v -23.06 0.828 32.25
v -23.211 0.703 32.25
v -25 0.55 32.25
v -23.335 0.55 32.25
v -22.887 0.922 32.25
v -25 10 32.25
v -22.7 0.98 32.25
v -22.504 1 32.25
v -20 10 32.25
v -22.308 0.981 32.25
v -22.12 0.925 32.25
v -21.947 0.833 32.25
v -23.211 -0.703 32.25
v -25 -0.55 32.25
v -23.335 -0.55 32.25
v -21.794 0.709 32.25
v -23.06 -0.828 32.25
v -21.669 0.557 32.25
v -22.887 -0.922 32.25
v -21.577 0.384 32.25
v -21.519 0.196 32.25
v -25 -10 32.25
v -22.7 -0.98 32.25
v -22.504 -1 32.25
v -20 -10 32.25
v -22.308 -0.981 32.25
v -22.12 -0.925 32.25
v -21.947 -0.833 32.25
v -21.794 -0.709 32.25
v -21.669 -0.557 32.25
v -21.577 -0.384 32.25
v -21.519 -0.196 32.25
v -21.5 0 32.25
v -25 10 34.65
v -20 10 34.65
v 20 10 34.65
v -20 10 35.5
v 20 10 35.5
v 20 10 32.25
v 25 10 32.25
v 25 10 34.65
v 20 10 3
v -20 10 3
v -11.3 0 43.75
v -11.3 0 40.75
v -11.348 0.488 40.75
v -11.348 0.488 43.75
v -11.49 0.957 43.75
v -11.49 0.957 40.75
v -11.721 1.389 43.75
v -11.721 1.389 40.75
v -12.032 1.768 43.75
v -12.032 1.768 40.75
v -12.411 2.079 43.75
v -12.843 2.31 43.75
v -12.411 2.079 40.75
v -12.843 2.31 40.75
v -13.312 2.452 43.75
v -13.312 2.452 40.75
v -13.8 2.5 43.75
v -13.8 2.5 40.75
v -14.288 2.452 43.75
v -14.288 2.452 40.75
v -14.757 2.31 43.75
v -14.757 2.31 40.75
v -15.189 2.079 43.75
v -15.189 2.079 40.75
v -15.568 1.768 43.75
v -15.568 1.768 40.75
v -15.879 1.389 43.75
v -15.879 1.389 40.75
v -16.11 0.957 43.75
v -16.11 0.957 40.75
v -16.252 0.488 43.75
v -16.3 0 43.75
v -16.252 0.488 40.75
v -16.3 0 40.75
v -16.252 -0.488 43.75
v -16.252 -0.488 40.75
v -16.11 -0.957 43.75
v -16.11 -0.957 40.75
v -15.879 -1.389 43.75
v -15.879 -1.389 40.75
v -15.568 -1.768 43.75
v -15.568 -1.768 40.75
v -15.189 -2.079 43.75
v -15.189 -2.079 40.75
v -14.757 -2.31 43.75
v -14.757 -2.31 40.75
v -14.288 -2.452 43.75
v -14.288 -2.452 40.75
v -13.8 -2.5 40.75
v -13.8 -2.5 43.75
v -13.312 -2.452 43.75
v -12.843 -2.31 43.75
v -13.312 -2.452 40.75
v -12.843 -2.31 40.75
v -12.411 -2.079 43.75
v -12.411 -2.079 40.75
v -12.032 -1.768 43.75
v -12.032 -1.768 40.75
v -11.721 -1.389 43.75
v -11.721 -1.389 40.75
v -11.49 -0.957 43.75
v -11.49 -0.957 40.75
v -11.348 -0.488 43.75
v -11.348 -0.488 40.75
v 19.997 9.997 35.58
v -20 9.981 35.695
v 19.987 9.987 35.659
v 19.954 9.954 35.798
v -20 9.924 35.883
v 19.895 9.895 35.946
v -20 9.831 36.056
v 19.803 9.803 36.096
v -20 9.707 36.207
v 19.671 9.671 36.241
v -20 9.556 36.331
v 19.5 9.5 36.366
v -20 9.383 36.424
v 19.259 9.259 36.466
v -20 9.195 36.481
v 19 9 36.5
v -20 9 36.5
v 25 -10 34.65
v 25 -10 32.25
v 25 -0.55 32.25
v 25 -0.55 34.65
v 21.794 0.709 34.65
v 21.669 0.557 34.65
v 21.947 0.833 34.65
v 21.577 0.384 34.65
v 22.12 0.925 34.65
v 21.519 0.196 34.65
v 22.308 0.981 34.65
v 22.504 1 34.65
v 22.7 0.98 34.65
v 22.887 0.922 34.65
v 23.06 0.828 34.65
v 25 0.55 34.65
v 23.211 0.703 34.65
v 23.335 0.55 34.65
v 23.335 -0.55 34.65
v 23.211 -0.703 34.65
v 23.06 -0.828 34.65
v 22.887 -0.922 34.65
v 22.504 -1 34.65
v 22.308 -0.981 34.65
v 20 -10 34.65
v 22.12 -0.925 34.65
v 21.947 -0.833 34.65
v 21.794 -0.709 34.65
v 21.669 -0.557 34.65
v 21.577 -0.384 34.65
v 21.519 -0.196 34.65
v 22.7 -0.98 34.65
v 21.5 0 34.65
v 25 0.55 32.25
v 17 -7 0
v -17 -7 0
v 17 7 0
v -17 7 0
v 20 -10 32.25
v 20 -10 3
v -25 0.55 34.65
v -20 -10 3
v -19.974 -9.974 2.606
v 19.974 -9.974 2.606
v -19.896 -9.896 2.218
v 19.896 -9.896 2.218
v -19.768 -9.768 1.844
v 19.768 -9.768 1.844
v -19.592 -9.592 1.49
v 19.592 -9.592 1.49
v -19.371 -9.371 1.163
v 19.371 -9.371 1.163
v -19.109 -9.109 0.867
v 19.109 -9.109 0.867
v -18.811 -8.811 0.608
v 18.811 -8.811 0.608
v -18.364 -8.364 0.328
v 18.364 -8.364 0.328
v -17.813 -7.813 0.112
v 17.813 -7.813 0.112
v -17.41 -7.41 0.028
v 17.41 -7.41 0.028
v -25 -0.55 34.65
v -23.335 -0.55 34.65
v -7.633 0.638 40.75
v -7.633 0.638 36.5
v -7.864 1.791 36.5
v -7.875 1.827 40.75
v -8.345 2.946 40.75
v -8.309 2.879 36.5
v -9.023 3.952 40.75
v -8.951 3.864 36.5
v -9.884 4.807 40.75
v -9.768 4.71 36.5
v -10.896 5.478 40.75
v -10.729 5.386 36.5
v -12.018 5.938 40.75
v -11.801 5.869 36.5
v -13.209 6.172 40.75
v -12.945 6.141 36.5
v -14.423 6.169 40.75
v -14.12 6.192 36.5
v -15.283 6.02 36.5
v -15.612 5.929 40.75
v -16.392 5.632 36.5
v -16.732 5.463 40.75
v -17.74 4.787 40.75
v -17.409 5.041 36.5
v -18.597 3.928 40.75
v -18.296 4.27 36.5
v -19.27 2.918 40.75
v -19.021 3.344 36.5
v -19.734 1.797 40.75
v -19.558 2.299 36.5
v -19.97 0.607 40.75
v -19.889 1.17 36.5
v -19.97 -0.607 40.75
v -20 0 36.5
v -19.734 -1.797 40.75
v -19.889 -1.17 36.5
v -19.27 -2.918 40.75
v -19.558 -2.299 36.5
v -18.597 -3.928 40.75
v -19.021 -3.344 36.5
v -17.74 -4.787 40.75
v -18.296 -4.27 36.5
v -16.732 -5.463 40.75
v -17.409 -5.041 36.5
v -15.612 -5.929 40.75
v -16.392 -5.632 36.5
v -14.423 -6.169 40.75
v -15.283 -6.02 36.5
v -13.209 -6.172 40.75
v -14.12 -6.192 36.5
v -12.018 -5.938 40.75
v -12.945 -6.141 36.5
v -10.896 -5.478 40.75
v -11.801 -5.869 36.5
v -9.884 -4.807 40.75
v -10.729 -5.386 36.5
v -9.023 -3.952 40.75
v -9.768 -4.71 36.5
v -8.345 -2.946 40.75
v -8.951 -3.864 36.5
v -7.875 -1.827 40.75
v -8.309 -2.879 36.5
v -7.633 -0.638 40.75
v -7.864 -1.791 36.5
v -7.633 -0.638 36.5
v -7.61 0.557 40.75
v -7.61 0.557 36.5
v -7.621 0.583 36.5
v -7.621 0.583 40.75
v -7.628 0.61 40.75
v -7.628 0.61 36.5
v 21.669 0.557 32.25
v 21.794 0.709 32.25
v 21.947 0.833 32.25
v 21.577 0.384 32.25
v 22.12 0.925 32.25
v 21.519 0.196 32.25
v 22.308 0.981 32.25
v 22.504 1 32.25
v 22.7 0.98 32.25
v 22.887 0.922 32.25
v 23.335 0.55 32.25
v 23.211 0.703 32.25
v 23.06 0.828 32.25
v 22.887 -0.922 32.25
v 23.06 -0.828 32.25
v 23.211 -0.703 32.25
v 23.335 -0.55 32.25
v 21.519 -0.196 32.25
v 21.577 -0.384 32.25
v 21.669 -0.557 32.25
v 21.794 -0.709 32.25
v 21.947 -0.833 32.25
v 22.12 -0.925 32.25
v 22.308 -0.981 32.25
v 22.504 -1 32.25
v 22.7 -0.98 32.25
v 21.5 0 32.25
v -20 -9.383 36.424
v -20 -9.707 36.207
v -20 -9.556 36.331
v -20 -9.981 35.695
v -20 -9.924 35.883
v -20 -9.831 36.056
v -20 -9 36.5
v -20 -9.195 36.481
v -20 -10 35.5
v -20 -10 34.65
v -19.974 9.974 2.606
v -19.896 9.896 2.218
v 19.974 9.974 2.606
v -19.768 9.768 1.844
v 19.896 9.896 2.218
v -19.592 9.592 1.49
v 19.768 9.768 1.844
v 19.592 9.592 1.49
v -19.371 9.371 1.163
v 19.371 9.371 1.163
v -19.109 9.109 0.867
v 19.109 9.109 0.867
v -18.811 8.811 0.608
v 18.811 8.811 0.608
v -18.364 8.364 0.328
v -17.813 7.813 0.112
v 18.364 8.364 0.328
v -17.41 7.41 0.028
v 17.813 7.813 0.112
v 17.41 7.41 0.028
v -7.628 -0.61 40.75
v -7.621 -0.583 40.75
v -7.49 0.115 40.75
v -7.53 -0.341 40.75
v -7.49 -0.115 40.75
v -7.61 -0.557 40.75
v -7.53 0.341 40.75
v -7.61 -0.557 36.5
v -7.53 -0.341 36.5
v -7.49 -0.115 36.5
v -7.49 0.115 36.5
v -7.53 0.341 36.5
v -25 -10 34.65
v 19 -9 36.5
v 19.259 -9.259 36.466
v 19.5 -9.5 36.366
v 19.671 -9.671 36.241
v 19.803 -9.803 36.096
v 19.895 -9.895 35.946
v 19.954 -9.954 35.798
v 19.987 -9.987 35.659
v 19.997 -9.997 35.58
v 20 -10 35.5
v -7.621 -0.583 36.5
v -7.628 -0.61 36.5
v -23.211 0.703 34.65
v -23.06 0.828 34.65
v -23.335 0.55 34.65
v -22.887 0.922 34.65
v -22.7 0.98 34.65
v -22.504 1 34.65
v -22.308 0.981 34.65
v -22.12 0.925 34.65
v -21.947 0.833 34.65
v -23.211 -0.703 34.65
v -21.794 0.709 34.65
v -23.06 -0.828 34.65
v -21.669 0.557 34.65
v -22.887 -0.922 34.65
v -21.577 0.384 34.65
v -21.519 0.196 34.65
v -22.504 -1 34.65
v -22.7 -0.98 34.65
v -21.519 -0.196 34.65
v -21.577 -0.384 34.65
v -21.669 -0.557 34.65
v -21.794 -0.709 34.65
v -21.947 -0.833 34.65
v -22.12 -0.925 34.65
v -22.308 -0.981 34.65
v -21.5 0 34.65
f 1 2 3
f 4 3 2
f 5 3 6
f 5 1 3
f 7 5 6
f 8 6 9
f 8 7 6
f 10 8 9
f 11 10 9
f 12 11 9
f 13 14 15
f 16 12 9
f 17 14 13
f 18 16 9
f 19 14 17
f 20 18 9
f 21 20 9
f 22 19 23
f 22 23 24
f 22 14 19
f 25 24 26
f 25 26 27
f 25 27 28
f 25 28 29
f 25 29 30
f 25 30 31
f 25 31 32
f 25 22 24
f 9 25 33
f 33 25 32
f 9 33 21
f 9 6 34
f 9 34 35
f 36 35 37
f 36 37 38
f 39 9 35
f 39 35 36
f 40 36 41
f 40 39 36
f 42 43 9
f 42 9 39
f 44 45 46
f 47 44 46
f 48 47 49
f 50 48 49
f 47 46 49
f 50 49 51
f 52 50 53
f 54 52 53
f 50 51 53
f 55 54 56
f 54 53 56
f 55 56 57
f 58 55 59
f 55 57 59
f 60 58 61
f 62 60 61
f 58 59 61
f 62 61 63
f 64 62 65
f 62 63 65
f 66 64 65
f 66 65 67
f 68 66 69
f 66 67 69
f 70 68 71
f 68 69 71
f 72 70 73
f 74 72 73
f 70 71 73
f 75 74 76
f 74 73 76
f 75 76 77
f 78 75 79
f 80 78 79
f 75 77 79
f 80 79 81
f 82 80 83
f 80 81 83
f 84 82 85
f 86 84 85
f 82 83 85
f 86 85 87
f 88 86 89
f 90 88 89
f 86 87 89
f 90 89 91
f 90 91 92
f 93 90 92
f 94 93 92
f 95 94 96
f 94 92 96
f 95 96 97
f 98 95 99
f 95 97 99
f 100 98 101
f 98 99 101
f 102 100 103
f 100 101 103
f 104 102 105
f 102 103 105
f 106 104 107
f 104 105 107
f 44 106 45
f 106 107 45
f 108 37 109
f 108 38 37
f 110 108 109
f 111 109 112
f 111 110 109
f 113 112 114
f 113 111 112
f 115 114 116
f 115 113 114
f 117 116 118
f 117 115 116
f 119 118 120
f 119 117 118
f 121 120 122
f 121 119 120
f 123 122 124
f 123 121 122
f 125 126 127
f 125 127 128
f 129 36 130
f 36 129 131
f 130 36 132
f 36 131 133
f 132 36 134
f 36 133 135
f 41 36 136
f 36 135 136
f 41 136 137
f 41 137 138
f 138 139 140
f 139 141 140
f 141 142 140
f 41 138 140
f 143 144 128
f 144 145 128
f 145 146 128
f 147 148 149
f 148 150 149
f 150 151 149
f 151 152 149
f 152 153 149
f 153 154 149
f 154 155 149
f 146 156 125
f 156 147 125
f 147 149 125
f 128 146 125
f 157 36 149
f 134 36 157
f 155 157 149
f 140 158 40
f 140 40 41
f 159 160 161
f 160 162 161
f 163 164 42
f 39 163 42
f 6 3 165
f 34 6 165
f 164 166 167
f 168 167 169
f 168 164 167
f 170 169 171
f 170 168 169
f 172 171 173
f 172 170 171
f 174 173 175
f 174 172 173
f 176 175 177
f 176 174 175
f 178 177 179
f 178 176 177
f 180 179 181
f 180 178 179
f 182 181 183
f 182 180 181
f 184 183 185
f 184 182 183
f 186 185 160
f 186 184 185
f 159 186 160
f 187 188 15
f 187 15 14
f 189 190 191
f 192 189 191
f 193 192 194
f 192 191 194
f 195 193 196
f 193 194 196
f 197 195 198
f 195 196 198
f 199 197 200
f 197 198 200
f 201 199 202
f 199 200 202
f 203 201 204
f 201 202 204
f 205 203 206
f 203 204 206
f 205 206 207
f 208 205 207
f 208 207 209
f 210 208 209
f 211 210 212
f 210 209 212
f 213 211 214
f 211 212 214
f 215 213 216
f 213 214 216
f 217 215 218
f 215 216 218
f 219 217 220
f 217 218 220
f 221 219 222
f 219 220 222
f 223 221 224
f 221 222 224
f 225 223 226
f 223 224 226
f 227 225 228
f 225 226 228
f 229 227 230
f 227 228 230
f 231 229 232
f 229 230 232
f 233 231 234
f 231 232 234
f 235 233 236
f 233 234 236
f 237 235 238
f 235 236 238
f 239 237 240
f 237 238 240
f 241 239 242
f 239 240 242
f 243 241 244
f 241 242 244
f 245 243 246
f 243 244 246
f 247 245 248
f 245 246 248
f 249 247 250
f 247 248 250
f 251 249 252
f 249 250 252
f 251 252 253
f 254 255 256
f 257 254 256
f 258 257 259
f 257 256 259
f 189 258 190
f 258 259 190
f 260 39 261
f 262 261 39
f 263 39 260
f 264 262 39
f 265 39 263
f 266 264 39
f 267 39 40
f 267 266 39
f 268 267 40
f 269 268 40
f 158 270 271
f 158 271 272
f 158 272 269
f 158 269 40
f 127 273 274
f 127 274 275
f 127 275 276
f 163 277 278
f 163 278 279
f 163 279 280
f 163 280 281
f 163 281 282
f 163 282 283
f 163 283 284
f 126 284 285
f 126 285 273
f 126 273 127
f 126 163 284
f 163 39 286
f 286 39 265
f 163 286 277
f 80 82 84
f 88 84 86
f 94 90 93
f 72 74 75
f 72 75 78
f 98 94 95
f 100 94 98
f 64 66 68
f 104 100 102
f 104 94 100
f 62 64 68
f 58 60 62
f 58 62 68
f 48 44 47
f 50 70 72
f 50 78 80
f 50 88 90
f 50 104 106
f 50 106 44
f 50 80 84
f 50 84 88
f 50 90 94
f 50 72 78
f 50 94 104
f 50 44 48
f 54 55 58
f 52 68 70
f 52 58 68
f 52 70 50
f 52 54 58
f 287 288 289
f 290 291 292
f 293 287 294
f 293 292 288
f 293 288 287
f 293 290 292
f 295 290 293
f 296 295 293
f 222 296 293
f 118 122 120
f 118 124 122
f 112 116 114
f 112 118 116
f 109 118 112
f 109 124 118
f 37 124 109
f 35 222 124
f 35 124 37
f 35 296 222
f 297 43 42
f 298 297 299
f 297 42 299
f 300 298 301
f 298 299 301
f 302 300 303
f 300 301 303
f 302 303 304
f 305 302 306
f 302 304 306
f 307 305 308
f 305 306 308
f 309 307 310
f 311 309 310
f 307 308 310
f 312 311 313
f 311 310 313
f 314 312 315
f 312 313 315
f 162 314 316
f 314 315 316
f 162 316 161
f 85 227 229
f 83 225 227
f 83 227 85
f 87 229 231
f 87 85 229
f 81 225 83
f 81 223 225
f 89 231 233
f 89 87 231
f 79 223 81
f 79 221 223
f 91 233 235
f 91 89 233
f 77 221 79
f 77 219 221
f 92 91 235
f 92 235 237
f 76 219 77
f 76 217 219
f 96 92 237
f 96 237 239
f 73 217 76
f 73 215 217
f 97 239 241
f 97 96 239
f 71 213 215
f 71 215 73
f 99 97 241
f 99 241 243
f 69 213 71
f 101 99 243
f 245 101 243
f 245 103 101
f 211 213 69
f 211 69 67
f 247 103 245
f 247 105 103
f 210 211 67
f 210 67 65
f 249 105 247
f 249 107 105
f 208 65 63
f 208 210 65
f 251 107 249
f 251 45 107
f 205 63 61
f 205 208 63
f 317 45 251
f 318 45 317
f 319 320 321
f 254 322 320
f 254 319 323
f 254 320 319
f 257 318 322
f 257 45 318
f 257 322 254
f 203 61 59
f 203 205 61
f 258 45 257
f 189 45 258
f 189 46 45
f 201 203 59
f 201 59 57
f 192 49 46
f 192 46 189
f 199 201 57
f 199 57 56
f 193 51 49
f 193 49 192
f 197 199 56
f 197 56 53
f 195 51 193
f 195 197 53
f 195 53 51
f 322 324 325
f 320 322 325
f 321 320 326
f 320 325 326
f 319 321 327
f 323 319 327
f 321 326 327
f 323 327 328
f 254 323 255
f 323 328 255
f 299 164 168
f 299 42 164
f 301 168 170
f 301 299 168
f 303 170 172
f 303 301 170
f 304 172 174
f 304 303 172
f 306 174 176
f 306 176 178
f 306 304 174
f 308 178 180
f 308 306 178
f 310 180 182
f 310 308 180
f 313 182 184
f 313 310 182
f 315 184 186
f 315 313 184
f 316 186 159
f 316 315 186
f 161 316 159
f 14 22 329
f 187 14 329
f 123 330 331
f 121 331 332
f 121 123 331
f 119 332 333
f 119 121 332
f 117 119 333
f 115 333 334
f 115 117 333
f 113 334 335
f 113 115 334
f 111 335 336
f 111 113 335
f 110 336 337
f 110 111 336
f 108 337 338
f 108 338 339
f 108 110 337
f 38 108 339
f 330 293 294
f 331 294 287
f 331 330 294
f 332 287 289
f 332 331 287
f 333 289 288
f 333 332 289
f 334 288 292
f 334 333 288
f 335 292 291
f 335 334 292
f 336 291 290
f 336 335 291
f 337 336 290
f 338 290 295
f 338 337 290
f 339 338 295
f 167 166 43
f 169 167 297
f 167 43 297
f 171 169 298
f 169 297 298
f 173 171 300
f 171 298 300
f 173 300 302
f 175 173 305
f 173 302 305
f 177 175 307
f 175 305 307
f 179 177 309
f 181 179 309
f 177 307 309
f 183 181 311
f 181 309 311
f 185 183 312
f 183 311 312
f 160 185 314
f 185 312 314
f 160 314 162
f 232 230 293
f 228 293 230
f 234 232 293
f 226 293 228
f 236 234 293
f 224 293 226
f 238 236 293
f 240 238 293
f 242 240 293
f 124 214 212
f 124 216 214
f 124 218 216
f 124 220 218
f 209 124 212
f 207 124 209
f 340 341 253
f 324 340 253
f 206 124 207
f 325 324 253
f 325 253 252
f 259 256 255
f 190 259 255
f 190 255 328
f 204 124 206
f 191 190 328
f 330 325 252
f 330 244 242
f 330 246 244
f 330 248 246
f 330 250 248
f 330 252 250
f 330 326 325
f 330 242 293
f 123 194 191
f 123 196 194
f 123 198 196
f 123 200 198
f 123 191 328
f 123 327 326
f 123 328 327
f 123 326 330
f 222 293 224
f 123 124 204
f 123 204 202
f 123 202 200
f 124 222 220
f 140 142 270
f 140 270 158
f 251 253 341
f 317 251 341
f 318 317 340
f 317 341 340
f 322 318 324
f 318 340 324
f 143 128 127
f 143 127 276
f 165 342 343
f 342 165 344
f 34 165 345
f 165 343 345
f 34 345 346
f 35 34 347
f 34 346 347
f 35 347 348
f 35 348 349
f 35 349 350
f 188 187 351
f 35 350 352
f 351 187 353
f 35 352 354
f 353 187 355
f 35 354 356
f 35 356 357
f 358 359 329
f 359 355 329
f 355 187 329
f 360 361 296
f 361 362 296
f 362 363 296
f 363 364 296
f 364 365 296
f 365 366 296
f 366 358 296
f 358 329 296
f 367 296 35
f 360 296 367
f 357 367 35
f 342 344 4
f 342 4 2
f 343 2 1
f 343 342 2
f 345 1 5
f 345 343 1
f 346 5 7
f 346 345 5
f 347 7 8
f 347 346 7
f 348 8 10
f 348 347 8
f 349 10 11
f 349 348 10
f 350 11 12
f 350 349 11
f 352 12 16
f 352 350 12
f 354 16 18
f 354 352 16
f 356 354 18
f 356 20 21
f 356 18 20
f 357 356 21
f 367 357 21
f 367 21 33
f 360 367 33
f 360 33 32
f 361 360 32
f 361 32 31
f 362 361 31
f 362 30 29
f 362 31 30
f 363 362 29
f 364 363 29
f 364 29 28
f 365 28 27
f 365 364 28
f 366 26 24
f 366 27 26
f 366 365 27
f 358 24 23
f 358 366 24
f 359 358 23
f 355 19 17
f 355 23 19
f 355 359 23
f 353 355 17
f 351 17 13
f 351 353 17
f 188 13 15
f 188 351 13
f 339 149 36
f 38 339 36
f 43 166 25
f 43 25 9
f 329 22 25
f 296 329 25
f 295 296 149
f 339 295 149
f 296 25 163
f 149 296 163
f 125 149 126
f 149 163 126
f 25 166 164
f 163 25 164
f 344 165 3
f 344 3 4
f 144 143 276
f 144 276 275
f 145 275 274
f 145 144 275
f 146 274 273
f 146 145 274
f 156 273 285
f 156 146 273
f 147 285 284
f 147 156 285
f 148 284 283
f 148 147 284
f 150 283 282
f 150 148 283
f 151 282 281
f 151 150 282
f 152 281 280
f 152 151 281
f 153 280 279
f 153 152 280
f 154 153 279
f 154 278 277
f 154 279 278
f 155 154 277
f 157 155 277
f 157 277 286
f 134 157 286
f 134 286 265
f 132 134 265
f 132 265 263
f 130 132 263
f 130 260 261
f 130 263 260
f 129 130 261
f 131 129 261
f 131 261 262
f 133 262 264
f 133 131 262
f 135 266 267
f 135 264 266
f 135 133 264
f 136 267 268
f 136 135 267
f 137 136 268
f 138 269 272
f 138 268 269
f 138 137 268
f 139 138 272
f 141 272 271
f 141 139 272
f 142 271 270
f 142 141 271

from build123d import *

# Parameters (mm, degrees)
SKETCH1_W           = 40
SKETCH1_H           = 20
BOSS_EXTRUDE1_DEPTH = 36.5
SKETCH2_W           = 5
SKETCH2_H           = 2.4
BOSS_EXTRUDE2_DEPTH = 20
CUT_EXTRUDE1_DEPTH  = 44.881915409
BOSS_EXTRUDE3_DEPTH = 4.25
SKETCH9_R           = 2.5
BOSS_EXTRUDE4_DEPTH = 3
FILLET1_R           = 3
FILLET2_R           = 1


with BuildPart() as part:
    # Sketch1 → Boss-Extrude1 (new body)
    with BuildSketch(Plane.XY):
        Rectangle(SKETCH1_W, SKETCH1_H)
    extrude(amount=BOSS_EXTRUDE1_DEPTH)

    # Sketch2 → Boss-Extrude2 (add)
    with BuildSketch(Plane.XZ.offset(10)):
        with Locations((22.5, 33.45)):
            Rectangle(SKETCH2_W, SKETCH2_H)
        with Locations((-22.5, 33.45)):
            Rectangle(SKETCH2_W, SKETCH2_H)
    extrude(amount=-BOSS_EXTRUDE2_DEPTH)

    # Sketch3 → Cut-Extrude1 (cut, through all)
    with BuildSketch(Plane.XY.offset(34.65)):
        with BuildLine():
            Line((25, -0.55), (23.335164654, -0.55))
            ThreePointArc((23.335164654, -0.55), (21.5, 0), (23.335164654, 0.55))
            Line((23.335164654, 0.55), (25, 0.55))
            Line((25, 0.55), (25, -0.55))
        make_face()
        with BuildLine():
            Line((-25, 0.55), (-23.335164654, 0.55))
            ThreePointArc((-23.335164654, 0.55), (-21.5, 0), (-23.335164654, -0.55))
            Line((-23.335164654, -0.55), (-25, -0.55))
            Line((-25, -0.55), (-25, 0.55))
        make_face()
    extrude(amount=-CUT_EXTRUDE1_DEPTH, mode=Mode.SUBTRACT)

    # Sketch4 → Boss-Extrude3 (add)
    with BuildSketch(Plane.XY.offset(36.5)):
        with BuildLine():
            ThreePointArc((-7.632955955, 0.638410329), (-20, 0), (-7.632955955, -0.638410329))
            ThreePointArc((-7.632955955, -0.638410329), (-7.625027484, -0.596751111), (-7.610171977, -0.557031281))
            ThreePointArc((-7.610171977, -0.557031281), (-7.484785169, 0), (-7.610171977, 0.557031281))
            ThreePointArc((-7.610171977, 0.557031281), (-7.625027484, 0.596751111), (-7.632955955, 0.638410329))
        make_face()
    extrude(amount=BOSS_EXTRUDE3_DEPTH)

    # Sketch9 → Boss-Extrude4 (add)
    with BuildSketch(Plane.XY.offset(40.75)):
        with Locations((-13.8, 0)):
            Circle(SKETCH9_R)
    extrude(amount=BOSS_EXTRUDE4_DEPTH)

    # Fillet1
    fillet1_edges = [part.edges().sort_by_distance(p)[0] for p in [
        (0, -10, 0),
        (-20, 0, 0),
        (0, 10, 0),
        (20, 0, 0),
    ]]
    fillet(fillet1_edges, radius=FILLET1_R)

    # Fillet2
    fillet2_edges = [part.edges().sort_by_distance(p)[0] for p in [
        (0, -10, 36.5),
        (20, 0, 36.5),
        (0, 10, 36.5),
    ]]
    fillet(fillet2_edges, radius=FILLET2_R)


solid = part.part
